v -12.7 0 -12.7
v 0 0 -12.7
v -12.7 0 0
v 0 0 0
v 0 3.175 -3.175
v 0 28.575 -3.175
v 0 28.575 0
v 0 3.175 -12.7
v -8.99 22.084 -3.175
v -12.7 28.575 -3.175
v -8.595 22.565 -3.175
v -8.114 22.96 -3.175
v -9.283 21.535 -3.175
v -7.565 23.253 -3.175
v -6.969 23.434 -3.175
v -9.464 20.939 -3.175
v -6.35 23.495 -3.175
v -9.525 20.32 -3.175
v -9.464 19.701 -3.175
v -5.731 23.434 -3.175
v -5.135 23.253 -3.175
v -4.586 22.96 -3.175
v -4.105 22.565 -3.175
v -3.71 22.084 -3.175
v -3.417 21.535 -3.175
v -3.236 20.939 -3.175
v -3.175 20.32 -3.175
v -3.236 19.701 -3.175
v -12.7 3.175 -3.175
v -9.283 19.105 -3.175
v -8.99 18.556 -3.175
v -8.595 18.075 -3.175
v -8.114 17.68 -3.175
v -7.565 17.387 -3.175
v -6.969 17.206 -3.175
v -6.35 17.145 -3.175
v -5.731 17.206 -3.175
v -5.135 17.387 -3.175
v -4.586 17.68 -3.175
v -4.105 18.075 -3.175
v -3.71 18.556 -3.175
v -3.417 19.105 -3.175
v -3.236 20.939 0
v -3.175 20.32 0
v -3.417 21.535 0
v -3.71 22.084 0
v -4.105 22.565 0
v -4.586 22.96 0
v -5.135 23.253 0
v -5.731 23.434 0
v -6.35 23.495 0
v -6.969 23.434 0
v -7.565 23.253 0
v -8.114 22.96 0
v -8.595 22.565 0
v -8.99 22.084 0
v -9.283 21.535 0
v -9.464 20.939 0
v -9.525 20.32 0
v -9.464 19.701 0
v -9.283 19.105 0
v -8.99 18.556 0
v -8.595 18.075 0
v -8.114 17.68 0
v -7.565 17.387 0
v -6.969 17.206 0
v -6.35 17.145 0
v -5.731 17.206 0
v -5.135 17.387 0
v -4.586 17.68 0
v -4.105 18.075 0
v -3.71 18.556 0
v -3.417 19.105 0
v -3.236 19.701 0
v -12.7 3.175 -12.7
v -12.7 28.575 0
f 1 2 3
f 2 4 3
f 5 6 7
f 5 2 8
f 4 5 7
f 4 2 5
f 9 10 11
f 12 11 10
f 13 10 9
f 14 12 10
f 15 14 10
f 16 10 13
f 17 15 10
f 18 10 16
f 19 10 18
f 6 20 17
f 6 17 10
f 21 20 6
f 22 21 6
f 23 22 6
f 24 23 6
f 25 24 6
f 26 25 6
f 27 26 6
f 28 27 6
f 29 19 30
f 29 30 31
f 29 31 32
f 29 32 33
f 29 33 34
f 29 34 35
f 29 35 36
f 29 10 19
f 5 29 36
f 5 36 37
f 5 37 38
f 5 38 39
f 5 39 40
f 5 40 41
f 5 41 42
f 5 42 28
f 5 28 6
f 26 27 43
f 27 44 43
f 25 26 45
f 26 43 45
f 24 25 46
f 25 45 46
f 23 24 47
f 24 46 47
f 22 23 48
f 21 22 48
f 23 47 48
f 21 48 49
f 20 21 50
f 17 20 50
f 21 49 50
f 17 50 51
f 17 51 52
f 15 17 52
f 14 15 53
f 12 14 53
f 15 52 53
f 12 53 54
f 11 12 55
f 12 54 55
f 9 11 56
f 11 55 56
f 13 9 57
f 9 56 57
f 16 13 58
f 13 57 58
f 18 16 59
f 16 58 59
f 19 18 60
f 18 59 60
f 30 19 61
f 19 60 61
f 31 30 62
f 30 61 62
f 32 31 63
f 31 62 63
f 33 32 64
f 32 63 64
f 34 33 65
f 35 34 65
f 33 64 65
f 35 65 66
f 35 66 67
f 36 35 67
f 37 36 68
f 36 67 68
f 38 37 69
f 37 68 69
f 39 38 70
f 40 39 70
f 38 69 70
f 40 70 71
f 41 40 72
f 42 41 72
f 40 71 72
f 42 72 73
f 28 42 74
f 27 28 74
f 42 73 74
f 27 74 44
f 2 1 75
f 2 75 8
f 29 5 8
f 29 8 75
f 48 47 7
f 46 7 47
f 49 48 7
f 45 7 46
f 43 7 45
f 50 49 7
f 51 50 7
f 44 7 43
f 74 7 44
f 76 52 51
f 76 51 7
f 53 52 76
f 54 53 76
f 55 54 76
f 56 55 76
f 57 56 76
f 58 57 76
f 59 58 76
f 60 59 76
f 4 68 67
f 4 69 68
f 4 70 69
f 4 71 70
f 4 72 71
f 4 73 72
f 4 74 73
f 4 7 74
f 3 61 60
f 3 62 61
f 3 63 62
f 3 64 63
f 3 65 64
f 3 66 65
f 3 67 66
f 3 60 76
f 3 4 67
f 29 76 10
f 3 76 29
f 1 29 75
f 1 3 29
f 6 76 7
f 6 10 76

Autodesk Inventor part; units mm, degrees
ref_plane "YZ Plane" through (0, 0, 0) normal (1, 0, 0) x (0, 1, 0)
ref_plane "XZ Plane" through (0, 0, 0) normal (0, 1, 0) x (-1, 0, 0)
ref_plane "XY Plane" through (0, 0, 0) normal (0, 0, 1) x (1, 0, 0)
sketch "Sketch1" plane through (0, 0, 0) normal (0, 1, 0) x (-1, 0, 0)
  line L0 (0, 0) -> (12.7, 0)
  line L1 (12.7, 0) -> (12.7, -12.7)
  line L2 (12.7, -12.7) -> (0, -12.7)
  line L3 (0, -12.7) -> (0, 0)
  dimension "d0" = 12.7
  dimension "d1" = 12.7
extrude "Extrusion1" add sketch "Sketch1" along normal blind 3.175
sketch "Sketch2" plane through (0, 3.175, 0) normal (0, 1, 0) x (1, 0, 0)
  line L0 (-12.7, 12.7) -> (-12.7, 0) projected
  line L1 (0, 0) -> (-12.7, 0)
  line L2 (-12.7, 0) -> (-12.7, 3.175)
  line L3 (-12.7, 3.175) -> (0, 3.175)
  line L4 (0, 3.175) -> (0, 0)
  dimension "d4" = 3.175
extrude "Extrusion2" add sketch "Sketch2" along normal blind 25.4
sketch "Sketch3" plane through (-12.7, 0, 0) normal (0, 0, 1) x (1, 0, 0)
  circle A0 centre (6.35, 20.32) radius 3.175
  line L0 (12.7, 0) -> (0, 0) projected
  line L1 (0, 0) -> (0, 28.575) projected
  dimension "d7" = 6.35
  dimension "d8" = 20.32
  dimension "d9" = 6.35
extrude "Extrusion3" cut sketch "Sketch3" against normal blind 4.7625
properties part number "BackMount2CylinderAdapter"
